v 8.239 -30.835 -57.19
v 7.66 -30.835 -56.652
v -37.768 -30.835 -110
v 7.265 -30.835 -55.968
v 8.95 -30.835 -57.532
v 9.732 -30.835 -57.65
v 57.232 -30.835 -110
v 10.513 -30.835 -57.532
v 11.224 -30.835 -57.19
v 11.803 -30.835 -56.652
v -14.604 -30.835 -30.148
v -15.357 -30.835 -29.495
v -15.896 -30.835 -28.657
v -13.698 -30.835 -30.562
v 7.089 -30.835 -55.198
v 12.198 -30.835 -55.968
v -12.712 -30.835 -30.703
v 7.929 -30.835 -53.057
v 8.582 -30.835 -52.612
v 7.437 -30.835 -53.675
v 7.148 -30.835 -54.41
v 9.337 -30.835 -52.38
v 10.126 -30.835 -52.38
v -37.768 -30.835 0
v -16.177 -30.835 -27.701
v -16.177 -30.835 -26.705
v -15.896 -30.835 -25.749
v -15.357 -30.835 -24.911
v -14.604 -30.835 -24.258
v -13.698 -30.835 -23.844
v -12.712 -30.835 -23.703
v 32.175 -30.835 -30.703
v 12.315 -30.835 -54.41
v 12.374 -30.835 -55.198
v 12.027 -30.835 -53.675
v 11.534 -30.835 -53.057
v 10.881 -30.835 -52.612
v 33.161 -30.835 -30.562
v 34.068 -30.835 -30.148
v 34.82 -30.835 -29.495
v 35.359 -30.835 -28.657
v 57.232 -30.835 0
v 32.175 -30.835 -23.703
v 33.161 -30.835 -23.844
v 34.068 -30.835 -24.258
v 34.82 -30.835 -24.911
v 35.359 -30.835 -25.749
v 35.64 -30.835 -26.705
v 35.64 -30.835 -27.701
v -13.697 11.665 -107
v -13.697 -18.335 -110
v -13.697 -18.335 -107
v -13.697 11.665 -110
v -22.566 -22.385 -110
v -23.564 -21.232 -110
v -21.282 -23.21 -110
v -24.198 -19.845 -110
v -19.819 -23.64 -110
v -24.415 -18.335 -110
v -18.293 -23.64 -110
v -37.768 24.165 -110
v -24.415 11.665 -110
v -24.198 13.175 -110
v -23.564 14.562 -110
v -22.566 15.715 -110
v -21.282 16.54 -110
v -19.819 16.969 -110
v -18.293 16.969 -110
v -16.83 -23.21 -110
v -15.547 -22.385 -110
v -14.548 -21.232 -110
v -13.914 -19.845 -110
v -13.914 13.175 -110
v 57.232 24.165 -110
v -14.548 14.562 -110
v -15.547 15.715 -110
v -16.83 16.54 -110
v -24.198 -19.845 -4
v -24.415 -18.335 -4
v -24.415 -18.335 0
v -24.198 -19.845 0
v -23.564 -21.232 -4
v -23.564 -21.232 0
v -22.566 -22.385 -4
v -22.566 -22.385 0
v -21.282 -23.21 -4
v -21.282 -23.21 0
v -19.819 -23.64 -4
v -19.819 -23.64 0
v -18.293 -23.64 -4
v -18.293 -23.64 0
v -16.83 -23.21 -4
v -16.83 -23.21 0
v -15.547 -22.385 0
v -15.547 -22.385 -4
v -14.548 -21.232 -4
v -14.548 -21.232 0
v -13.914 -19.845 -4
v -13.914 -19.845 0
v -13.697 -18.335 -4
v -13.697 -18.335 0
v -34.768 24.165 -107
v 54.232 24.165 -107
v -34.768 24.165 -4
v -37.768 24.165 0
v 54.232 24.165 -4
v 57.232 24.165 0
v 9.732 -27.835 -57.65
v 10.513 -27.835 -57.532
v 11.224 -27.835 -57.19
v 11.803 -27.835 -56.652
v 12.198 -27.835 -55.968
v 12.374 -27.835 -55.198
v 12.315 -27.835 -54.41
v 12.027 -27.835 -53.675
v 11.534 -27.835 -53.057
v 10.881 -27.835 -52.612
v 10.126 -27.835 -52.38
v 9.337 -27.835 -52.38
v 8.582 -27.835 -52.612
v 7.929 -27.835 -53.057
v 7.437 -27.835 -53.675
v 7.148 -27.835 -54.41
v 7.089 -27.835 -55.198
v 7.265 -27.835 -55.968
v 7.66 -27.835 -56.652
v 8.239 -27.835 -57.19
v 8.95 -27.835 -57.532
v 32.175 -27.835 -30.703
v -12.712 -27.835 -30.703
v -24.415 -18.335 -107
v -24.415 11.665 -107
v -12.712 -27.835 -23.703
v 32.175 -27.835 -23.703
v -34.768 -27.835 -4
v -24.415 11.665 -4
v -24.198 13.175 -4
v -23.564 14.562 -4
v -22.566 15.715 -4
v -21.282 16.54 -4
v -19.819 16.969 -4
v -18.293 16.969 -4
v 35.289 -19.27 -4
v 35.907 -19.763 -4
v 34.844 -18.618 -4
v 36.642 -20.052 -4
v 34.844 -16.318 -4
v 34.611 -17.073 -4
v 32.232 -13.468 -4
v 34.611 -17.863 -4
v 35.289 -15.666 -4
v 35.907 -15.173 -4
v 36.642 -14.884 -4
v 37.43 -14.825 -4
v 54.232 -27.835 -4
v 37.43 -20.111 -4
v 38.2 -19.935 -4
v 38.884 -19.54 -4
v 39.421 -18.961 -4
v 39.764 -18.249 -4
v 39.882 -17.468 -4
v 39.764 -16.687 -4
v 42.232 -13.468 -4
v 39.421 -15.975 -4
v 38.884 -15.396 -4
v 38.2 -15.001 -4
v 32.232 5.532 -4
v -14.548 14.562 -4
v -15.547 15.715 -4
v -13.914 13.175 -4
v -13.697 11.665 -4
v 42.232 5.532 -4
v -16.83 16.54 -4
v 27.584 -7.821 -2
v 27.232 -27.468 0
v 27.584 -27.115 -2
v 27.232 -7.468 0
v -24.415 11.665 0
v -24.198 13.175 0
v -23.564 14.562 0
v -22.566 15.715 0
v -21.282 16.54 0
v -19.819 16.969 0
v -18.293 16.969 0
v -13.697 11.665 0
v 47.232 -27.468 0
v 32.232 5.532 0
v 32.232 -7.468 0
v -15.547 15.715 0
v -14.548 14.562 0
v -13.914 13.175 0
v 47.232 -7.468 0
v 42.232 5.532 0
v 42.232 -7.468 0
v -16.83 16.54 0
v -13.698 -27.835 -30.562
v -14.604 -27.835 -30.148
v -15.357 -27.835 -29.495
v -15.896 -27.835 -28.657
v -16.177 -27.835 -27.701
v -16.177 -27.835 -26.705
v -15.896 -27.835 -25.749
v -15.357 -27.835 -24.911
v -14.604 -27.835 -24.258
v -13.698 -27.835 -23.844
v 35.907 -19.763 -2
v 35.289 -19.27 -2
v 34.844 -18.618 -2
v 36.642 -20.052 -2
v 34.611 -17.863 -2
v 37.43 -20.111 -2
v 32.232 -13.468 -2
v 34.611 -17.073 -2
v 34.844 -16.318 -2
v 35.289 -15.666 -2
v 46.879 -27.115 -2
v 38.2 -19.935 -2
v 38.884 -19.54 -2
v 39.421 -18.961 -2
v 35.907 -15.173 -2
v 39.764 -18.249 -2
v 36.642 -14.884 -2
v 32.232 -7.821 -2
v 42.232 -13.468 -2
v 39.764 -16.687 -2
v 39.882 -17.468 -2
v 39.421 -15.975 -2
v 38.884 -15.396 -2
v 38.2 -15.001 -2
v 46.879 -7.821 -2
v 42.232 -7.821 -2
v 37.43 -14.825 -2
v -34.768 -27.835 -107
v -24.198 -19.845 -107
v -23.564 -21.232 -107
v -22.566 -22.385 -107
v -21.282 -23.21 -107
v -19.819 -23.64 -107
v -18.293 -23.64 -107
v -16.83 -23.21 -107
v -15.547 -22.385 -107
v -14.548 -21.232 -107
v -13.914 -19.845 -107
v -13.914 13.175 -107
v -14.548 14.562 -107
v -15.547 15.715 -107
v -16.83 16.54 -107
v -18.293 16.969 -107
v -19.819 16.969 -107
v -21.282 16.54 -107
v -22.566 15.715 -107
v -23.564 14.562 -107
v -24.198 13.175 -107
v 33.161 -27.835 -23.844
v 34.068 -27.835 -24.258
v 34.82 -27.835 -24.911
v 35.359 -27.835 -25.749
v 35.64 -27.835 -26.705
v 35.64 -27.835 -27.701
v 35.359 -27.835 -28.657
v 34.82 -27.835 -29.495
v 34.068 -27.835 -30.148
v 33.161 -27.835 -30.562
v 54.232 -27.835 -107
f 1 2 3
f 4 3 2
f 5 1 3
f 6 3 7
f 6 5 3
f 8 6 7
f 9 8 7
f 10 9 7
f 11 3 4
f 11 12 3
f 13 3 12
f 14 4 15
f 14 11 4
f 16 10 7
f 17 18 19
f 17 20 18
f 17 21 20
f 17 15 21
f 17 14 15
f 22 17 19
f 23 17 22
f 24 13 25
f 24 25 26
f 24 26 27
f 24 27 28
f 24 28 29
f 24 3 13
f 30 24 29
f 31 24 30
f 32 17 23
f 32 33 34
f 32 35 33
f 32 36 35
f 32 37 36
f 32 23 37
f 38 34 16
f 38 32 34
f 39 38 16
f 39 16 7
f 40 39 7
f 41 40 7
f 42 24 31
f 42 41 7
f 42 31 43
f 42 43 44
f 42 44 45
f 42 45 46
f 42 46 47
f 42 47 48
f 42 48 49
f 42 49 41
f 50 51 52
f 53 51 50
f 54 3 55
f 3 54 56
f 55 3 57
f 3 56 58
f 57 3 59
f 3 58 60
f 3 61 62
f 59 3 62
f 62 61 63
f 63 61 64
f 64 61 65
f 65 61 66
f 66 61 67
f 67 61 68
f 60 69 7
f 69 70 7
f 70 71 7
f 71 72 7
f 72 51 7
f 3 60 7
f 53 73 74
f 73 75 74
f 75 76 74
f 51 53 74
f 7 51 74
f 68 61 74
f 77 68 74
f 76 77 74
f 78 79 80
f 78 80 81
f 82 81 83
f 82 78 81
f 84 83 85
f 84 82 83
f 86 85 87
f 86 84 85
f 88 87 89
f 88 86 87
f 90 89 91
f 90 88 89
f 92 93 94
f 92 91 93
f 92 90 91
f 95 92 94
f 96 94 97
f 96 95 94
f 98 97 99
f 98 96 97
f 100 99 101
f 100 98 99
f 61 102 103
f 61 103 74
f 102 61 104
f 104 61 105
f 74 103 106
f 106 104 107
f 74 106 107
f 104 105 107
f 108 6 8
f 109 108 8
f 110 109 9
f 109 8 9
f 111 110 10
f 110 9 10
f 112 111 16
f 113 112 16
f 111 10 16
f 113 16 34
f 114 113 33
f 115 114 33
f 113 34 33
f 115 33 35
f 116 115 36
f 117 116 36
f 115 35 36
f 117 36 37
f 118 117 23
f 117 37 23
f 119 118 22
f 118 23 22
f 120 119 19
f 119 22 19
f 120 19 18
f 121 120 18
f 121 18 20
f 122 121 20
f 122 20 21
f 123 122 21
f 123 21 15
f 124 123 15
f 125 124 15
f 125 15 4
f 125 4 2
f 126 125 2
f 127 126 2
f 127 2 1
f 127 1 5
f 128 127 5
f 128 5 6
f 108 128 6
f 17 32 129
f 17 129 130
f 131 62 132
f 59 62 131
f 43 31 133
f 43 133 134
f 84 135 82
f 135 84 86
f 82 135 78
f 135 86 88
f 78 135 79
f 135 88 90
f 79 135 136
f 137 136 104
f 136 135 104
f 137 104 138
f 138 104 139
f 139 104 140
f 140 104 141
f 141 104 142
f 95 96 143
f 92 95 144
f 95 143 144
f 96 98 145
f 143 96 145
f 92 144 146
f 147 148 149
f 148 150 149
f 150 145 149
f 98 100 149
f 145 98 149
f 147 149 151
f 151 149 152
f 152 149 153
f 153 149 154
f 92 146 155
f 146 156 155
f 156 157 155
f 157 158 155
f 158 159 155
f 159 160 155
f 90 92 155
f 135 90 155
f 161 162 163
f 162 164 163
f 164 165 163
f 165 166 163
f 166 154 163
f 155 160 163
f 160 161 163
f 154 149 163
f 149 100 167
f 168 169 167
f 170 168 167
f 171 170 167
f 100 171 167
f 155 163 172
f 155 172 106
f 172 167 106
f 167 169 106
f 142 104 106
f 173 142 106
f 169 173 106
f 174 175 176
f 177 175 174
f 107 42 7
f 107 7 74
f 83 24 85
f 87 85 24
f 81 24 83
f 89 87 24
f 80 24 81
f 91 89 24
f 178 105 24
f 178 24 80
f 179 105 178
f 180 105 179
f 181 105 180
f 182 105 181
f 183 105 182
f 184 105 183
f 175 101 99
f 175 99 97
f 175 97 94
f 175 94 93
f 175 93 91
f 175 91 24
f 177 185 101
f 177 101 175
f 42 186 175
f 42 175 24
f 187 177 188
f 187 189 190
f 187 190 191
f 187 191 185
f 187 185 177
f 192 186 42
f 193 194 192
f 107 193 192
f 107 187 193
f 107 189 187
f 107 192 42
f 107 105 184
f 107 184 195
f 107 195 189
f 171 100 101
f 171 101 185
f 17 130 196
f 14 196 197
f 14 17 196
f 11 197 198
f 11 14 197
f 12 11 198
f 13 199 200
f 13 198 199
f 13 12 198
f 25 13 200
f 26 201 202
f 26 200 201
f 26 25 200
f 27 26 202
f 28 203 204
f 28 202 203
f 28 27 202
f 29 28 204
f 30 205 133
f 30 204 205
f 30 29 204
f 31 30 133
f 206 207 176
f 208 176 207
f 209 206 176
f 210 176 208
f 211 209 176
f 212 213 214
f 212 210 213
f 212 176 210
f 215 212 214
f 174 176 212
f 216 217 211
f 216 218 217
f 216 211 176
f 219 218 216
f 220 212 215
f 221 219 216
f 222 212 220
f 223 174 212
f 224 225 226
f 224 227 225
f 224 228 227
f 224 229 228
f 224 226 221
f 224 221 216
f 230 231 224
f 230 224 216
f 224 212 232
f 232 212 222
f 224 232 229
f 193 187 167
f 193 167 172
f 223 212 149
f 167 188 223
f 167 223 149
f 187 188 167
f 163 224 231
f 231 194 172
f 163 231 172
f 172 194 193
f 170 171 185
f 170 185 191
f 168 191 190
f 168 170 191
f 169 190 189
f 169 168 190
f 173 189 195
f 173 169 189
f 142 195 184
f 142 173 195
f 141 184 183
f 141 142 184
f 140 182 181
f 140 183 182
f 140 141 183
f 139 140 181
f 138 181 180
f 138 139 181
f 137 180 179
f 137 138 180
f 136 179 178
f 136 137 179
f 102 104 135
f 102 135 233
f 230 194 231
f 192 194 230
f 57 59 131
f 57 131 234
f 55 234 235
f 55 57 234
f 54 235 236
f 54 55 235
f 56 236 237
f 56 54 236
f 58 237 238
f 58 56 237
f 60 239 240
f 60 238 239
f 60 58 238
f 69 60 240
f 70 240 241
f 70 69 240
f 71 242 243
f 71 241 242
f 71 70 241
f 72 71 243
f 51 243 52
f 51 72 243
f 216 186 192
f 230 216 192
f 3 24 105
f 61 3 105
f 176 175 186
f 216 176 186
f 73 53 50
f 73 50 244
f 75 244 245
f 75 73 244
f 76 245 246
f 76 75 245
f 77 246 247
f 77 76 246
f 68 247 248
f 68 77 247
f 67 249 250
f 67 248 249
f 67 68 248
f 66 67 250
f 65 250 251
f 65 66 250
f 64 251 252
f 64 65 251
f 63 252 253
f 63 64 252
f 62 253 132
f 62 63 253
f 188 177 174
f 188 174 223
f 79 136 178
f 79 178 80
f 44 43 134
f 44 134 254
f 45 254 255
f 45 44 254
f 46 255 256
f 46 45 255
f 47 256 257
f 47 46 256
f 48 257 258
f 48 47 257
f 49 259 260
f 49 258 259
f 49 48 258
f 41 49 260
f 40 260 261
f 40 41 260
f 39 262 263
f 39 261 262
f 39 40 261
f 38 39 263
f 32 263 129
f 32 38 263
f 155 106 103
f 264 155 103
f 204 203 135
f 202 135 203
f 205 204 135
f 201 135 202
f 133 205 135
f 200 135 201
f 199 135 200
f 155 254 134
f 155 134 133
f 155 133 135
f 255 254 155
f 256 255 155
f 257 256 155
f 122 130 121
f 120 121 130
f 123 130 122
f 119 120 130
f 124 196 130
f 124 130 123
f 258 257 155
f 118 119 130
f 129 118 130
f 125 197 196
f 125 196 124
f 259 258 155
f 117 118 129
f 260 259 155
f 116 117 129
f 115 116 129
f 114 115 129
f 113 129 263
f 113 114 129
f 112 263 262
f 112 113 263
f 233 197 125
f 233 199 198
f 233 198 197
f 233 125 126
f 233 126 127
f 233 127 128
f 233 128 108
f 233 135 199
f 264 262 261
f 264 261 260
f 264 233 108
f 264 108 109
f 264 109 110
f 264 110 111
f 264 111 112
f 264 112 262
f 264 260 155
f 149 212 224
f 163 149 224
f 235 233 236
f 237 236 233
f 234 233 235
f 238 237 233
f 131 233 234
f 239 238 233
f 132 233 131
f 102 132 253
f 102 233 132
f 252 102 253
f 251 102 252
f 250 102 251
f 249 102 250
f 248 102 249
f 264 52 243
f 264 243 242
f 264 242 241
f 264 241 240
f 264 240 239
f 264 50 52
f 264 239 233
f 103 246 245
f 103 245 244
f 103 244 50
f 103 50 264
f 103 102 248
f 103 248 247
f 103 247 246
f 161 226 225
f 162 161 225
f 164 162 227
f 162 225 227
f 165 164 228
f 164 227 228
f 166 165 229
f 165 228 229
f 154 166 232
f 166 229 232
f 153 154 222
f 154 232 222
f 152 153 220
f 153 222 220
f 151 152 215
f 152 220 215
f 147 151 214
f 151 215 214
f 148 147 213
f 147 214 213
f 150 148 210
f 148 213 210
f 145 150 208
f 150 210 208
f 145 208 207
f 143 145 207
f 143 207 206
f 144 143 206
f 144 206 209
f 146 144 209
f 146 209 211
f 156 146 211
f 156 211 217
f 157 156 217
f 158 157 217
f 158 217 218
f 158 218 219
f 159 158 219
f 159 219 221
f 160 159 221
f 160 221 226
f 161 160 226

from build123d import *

# Parameters (mm, degrees)
SKETCH_196_W        = 95
SKETCH_196_H        = 55
EXTRUDE_2_DEPTH     = 110
SKETCH_556_W        = 89
SKETCH_556_H        = 103
CUT_EXTRUDE_1_DEPTH = 52
SKETCH_4_W          = 10
SKETCH_4_H          = 19
CUT_EXTRUDE_2_DEPTH = 10
SKETCH_5_R          = 2.65
CUT_EXTRUDE_3_DEPTH = 10
SKETCH_6_W          = 20
SKETCH_6_H          = 20
CUT_EXTRUDE_4_DEPTH = 2
CUT_EXTRUDE_4_DRAFT = -10
SKETCH_7_R          = 2.65
CUT_EXTRUDE_5_DEPTH = 5
CUT_EXTRUDE_6_DEPTH = 130


with BuildPart() as part:
    # Sketch 196 → 凸台-拉伸2 (new body)
    with BuildSketch(Plane.XY):
        with Locations((9.731535207, -3.335016835)):
            Rectangle(SKETCH_196_W, SKETCH_196_H)
    extrude(amount=-EXTRUDE_2_DEPTH)

    # Sketch 556 → 切除-拉伸1 (cut)
    with BuildSketch(Plane(origin=(0, 24.164983165, 0), x_dir=(1, 0, 0), z_dir=(0, 1, 0))):
        with Locations((9.731535207, 55.5)):
            Rectangle(SKETCH_556_W, SKETCH_556_H)
    extrude(amount=-CUT_EXTRUDE_1_DEPTH, mode=Mode.SUBTRACT)

    # 铝材侧<4> → 切除-拉伸2 (cut)
    with BuildSketch(Plane.XY):
        with Locations((37.231535207, -3.968013468)):
            Rectangle(SKETCH_4_W, SKETCH_4_H)
    extrude(amount=-CUT_EXTRUDE_2_DEPTH, mode=Mode.SUBTRACT)

    # 铝材侧<5> → 切除-拉伸3 (cut)
    with BuildSketch(Plane.XY):
        with Locations((37.231535207, -17.468013468)):
            Circle(SKETCH_5_R)
    extrude(amount=-CUT_EXTRUDE_3_DEPTH, mode=Mode.SUBTRACT)


with BuildPart() as cut_extrude_4_tool:
    # 铝材侧<6> → 切除-拉伸4 (with draft: the straight prism first)
    with BuildSketch(Plane.XY):
        with Locations((37.231535207, -17.468013468)):
            Rectangle(SKETCH_6_W, SKETCH_6_H)
    extrude(amount=-CUT_EXTRUDE_4_DEPTH)
    # 切除-拉伸4: the draft: its side faces are tilted about the plane it starts from
    cut_extrude_4_sides = [cut_extrude_4_tool.faces().sort_by_distance(p)[0] for p in [
        (27.231535207, -17.468013468, -1),
        (37.231535207, -27.468013468, -1),
        (47.231535207, -17.468013468, -1),
        (37.231535207, -7.468013468, -1),
    ]]
    draft(cut_extrude_4_sides, Plane.XY, CUT_EXTRUDE_4_DRAFT)


with BuildPart() as part_1:
    add(part.part)

    # 切除-拉伸4: cut by cut_extrude_4_tool
    add(cut_extrude_4_tool.part, mode=Mode.SUBTRACT)

    # 草图7 → 切除-拉伸5 (cut)
    with BuildSketch(Plane.XZ.offset(30.835016835)):
        with Locations((9.731535207, -55)):
            Circle(SKETCH_7_R)
        with BuildLine():
            Line((-12.711989835, -23.70260728), (32.17506025, -23.70260728))
            ThreePointArc((32.17506025, -23.70260728), (35.675426541, -27.202973571), (32.17506025, -30.703339862))
            Line((32.17506025, -30.703339862), (-12.711989835, -30.703339862))
            ThreePointArc((-12.711989835, -30.703339862), (-16.212356126, -27.202973571), (-12.711989835, -23.70260728))
        make_face()
    extrude(amount=-CUT_EXTRUDE_5_DEPTH, mode=Mode.SUBTRACT)

    # 草图8 → 切除-拉伸6 (cut)
    with BuildSketch(Plane(origin=(0, 0, -110), x_dir=(-1, 0, 0), z_dir=(0, 0, -1))):
        with BuildLine():
            Line((24.415116535, 11.664983165), (24.415116535, -18.335016835))
            ThreePointArc((24.415116535, -18.335016835), (19.056084672, -23.694048698), (13.697052809, -18.335016835))
            Line((13.697052809, -18.335016835), (13.697052809, 11.664983165))
            ThreePointArc((13.697052809, 11.664983165), (19.056084672, 17.024015028), (24.415116535, 11.664983165))
        make_face()
    extrude(amount=-CUT_EXTRUDE_6_DEPTH, mode=Mode.SUBTRACT)


solid = part_1.part
